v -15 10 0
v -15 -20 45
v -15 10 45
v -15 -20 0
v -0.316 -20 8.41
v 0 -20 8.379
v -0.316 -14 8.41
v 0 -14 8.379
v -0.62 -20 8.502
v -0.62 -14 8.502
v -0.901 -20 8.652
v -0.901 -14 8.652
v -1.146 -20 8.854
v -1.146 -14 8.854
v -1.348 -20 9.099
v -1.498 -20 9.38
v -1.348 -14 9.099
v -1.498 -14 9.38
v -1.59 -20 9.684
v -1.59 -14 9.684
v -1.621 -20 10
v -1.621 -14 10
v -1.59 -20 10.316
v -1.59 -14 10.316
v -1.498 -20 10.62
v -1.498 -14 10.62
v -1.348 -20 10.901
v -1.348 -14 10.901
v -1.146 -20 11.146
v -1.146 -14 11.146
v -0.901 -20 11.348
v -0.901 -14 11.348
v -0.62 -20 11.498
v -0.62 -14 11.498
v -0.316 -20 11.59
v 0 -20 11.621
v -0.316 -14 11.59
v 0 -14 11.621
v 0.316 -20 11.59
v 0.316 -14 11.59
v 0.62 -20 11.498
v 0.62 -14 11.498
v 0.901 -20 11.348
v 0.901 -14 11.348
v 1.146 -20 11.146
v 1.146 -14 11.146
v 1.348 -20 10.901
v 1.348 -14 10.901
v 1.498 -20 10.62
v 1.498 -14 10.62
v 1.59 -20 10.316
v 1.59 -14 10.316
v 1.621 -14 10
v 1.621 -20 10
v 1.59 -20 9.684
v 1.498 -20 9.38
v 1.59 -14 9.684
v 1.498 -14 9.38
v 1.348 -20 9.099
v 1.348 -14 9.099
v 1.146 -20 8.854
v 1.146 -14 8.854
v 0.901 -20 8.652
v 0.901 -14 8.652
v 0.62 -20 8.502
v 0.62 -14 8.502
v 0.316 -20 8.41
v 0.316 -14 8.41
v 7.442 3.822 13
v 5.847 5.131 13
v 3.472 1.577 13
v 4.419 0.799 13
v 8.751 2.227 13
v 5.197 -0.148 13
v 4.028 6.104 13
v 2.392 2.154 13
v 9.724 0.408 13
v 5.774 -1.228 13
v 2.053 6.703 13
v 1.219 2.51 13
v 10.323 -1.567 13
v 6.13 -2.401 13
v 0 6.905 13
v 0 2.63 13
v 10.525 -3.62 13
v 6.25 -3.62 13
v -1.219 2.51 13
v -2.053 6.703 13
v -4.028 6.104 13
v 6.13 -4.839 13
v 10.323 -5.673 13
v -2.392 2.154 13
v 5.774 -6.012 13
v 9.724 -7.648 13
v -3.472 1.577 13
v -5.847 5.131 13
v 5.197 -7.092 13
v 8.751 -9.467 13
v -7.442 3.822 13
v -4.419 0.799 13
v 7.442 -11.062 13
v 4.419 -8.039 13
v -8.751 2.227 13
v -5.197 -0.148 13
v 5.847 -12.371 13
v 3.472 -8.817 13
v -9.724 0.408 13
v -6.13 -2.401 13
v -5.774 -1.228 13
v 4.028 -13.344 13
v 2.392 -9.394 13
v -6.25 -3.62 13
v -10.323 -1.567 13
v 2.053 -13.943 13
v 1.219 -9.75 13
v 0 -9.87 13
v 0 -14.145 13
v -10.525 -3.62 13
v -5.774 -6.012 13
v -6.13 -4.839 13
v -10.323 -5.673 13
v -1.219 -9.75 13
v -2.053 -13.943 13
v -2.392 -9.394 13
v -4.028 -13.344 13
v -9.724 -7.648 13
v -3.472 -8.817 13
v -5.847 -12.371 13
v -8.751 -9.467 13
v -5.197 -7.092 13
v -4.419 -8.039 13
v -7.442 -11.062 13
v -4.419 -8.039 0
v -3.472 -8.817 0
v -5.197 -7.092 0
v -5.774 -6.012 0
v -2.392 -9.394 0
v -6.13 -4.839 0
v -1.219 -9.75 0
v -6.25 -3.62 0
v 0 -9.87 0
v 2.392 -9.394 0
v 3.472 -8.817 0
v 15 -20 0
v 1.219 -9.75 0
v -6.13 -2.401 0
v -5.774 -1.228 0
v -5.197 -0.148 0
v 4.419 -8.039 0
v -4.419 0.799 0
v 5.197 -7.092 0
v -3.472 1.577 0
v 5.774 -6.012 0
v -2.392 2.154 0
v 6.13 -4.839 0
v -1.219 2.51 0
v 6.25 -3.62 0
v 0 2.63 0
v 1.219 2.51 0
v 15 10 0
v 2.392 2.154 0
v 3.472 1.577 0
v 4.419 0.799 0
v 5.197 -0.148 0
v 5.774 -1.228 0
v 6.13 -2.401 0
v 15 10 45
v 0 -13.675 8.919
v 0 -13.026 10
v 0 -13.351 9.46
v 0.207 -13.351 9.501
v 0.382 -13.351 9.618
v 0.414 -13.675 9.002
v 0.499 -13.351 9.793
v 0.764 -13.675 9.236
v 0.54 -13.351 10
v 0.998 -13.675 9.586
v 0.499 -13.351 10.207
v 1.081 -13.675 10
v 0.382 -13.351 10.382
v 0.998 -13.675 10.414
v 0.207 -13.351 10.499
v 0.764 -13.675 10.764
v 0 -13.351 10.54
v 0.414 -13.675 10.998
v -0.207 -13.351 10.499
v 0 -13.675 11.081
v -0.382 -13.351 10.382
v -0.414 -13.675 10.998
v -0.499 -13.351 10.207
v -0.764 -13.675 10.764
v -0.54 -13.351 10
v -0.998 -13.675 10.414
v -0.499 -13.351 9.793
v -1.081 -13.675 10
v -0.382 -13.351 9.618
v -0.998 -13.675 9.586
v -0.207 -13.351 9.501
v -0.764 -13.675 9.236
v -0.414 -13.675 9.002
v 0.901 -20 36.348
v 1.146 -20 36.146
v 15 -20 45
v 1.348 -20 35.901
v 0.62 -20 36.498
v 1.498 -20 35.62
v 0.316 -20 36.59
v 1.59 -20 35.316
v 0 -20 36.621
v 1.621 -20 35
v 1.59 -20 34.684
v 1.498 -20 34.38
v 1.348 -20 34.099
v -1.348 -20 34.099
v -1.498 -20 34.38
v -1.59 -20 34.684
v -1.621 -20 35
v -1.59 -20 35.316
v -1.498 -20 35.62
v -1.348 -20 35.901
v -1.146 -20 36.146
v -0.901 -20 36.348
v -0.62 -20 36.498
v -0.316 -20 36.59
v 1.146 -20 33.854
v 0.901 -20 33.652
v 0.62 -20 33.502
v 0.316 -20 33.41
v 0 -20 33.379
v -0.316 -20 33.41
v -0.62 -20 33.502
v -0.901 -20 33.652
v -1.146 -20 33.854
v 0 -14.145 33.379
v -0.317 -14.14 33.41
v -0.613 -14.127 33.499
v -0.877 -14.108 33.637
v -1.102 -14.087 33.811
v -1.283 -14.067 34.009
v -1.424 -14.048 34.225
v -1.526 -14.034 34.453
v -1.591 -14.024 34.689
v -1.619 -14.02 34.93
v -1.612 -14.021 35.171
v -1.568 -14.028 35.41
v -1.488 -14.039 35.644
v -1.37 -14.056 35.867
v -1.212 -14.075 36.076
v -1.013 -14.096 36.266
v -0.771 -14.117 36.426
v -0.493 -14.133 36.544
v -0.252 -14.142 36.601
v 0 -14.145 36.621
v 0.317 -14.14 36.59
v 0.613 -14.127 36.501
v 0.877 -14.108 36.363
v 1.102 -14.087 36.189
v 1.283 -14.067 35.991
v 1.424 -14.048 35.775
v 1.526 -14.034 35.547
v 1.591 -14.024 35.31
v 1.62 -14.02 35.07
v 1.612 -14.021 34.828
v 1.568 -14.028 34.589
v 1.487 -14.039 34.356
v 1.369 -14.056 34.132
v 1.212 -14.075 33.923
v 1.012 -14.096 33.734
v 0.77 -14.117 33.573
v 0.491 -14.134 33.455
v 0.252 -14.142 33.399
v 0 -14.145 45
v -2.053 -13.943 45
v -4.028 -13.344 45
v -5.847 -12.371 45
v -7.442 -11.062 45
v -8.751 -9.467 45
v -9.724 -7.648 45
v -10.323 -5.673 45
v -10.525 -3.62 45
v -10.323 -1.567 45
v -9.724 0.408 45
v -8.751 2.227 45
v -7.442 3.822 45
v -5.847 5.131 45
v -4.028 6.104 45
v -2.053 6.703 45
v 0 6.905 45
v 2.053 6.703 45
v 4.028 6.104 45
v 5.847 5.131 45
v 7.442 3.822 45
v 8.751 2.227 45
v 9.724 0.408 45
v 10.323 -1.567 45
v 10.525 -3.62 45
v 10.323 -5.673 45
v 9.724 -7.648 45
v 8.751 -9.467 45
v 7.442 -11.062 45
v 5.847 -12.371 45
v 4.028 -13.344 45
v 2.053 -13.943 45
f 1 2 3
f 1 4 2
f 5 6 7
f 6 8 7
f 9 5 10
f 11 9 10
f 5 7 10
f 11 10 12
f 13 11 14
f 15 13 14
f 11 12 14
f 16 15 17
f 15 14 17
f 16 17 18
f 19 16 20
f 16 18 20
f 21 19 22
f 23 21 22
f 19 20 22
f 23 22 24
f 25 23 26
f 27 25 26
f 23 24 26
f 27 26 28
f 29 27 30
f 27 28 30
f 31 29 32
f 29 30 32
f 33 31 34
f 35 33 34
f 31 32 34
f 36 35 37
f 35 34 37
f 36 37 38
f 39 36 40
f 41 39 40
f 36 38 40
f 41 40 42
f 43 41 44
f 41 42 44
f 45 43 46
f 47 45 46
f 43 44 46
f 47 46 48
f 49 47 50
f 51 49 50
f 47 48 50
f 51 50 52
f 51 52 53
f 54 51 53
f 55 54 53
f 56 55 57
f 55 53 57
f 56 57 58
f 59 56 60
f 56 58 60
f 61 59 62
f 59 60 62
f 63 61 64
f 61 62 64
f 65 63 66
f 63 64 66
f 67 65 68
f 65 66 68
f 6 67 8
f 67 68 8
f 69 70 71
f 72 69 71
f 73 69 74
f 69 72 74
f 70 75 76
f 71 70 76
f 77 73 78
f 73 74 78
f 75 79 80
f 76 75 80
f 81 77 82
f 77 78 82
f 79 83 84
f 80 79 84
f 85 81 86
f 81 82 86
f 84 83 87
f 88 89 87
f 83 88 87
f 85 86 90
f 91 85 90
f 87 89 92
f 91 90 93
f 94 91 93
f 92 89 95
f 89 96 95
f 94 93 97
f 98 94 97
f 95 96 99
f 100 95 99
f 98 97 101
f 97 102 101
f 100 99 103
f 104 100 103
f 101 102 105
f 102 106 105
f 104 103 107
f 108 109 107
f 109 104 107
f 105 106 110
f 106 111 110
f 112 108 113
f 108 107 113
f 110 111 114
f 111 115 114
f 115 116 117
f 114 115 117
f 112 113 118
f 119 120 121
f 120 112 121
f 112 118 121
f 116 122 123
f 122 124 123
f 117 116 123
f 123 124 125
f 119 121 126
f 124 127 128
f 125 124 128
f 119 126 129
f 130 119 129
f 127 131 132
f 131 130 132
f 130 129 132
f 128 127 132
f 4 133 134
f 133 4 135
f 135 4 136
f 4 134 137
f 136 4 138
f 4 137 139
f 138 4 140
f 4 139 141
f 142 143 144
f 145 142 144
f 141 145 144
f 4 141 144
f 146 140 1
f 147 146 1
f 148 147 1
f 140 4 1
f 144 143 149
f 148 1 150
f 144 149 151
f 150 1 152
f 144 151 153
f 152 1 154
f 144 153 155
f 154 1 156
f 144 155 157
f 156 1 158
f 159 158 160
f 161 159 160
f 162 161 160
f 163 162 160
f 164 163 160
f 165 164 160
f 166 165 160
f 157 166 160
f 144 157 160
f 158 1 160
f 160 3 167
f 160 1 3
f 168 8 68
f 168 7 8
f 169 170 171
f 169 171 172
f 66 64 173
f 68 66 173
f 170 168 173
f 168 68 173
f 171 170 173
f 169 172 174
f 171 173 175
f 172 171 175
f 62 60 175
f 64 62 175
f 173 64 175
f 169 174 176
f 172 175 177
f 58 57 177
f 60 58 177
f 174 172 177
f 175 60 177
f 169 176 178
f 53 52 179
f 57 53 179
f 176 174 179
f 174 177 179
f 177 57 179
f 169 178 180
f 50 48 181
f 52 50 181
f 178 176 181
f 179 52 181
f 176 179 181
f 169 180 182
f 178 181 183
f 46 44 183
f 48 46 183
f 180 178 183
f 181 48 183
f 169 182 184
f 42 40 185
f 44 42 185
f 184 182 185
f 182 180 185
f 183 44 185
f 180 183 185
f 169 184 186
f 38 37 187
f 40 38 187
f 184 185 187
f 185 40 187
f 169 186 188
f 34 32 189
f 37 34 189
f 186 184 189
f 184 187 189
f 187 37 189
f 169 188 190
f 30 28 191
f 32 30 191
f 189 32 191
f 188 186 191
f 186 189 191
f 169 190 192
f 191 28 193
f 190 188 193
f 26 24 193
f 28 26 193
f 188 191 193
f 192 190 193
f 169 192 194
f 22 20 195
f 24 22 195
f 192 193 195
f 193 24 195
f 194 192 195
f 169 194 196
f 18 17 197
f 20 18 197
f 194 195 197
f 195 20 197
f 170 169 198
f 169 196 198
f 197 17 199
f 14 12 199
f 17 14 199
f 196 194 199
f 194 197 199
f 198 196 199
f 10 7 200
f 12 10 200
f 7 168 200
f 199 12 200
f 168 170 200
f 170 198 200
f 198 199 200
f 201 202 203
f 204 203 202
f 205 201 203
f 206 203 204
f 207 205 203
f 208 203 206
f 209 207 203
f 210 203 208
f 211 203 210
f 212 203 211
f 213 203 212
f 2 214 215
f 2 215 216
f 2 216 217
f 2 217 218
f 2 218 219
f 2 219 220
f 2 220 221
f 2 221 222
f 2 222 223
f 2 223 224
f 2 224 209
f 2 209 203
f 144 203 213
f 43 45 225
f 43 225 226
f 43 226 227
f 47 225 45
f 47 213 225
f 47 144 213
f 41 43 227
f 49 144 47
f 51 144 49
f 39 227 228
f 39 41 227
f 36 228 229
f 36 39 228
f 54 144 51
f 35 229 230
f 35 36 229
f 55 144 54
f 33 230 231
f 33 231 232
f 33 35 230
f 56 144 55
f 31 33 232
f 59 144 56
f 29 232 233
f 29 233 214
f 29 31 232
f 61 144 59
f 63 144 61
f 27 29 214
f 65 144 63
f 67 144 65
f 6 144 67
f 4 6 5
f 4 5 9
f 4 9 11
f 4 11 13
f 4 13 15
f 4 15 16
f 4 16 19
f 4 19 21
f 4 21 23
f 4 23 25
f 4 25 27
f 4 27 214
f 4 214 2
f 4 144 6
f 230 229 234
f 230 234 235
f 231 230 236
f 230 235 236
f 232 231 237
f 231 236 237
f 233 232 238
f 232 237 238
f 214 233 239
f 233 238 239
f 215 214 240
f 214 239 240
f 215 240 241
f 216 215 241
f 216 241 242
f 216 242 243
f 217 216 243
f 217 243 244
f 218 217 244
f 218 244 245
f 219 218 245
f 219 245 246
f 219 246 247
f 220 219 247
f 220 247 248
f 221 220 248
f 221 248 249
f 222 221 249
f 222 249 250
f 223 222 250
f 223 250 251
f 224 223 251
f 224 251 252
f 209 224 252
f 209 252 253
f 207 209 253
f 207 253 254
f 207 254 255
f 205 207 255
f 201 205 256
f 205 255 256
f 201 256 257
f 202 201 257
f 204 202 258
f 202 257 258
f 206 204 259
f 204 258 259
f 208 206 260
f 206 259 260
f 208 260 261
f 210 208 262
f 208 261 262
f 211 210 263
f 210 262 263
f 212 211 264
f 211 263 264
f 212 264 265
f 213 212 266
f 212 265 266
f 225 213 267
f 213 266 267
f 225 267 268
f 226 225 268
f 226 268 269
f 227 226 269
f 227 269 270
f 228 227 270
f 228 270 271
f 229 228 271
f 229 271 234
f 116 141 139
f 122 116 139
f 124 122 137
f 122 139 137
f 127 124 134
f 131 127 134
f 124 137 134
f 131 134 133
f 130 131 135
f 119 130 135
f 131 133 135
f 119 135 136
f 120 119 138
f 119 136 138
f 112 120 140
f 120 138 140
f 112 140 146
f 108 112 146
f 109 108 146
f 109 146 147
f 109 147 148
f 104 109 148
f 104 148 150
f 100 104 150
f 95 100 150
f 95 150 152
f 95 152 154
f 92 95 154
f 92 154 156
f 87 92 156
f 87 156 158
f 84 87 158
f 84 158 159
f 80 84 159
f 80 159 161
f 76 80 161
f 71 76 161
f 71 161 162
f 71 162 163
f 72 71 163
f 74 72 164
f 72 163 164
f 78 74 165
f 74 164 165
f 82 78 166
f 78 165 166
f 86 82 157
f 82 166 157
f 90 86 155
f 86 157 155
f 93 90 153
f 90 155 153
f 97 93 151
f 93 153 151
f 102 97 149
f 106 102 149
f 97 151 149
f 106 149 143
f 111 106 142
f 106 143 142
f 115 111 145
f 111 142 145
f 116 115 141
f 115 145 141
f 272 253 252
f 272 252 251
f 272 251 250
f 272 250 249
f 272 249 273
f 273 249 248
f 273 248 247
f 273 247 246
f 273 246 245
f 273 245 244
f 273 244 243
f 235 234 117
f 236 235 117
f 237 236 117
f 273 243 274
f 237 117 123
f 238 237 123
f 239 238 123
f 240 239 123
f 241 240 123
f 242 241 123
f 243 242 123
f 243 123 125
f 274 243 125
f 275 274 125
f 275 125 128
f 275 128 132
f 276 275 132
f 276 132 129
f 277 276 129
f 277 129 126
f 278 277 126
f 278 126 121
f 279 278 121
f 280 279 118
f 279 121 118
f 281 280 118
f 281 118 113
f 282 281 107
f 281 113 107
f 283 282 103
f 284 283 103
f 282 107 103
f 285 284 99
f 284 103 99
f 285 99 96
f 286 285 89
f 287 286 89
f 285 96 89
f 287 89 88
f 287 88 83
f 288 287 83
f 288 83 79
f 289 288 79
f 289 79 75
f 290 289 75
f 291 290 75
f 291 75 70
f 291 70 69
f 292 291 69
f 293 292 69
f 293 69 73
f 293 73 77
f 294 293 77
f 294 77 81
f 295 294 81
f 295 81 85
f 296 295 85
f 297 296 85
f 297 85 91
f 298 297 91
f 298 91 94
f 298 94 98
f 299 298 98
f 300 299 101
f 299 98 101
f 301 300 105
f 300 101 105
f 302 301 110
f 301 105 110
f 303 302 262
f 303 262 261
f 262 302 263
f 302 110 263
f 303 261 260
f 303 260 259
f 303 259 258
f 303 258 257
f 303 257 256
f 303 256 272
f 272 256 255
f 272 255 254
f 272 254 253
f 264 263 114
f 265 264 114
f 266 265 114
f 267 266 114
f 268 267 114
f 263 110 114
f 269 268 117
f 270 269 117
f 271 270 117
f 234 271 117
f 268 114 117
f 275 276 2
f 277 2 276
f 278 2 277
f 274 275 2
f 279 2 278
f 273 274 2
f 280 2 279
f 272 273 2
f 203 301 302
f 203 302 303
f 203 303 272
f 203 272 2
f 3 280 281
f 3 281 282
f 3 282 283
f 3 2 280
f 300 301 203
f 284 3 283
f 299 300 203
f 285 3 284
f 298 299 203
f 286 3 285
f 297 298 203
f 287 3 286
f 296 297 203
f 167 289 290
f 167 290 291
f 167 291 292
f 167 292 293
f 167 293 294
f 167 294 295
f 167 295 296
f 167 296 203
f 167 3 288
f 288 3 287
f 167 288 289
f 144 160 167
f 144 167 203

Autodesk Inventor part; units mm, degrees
ref_plane "YZ Plane" through (0, 0, 0) normal (1, 0, 0) x (0, 1, 0)
ref_plane "XZ Plane" through (0, 0, 0) normal (0, 1, 0) x (-1, 0, 0)
ref_plane "XY Plane" through (0, 0, 0) normal (0, 0, 1) x (1, 0, 0)
sketch "Esboço2" plane through (0, 0, 0) normal (0, 0, 1) x (1, 0, 0)
  line L0 (-15, 10) -> (15, 10)
  line L1 (15, 10) -> (15, -20)
  line L2 (15, -20) -> (-15, -20)
  line L3 (-15, -20) -> (-15, 10)
  line L4 (-15, 10) -> (15, -20) construction
  line L5 (15, 10) -> (-15, -20) construction
  point P0 (0, -5)
  dimension "d10" = 30
  dimension "d11" = 30
extrude "Extrusão1" add sketch "Esboço2" along normal blind 45
sketch "Esboço3" plane through (0, 0, 45) normal (0, 0, 1) x (1, 0, 0)
  line L0 (15, 10) -> (-15, 10) projected
  line L1 (0, 10) -> (0, -3.62)
  circle A0 centre (0, -3.62) radius 10.5
  point P0 (0, 0)
  dimension "d14" = 13.62
  dimension "d15" = 21
hole "Furo1" at (0, -3.62, 45) direction (0, 0, -1) diameter 12.5 end through all counterbore diameter 21.05 counterbore depth 32
sketch "Esboço4" plane through (-15, -20, 0) normal (0, -1, 0) x (1, 0, 0)
  line L0 (15, 0) -> (15, 45)
  line L1 (30, 45) -> (0, 45) projected
  circle A0 centre (15, 10) radius 1.6056 construction
  circle A1 centre (15, 35) radius 1.4692 construction
  line L2 (0, 0) -> (0, 45) construction
  line L3 (0, 22.5) -> (30, 22.5) construction
  line L4 (30, 0) -> (30, 45) construction
  dimension "d23" = 12.5
  dimension "d24" = 12.5
hole "Furo2" at (0, -20, 10) at (0, -20, 35) direction (0, 1, 0) diameter 3.242 depth 6 tip angle 118 thread size "M4x0.7" class "6H" standard "ANSI Metric M Profile"
properties part number "blocoSuporteRolamentosTeste"
